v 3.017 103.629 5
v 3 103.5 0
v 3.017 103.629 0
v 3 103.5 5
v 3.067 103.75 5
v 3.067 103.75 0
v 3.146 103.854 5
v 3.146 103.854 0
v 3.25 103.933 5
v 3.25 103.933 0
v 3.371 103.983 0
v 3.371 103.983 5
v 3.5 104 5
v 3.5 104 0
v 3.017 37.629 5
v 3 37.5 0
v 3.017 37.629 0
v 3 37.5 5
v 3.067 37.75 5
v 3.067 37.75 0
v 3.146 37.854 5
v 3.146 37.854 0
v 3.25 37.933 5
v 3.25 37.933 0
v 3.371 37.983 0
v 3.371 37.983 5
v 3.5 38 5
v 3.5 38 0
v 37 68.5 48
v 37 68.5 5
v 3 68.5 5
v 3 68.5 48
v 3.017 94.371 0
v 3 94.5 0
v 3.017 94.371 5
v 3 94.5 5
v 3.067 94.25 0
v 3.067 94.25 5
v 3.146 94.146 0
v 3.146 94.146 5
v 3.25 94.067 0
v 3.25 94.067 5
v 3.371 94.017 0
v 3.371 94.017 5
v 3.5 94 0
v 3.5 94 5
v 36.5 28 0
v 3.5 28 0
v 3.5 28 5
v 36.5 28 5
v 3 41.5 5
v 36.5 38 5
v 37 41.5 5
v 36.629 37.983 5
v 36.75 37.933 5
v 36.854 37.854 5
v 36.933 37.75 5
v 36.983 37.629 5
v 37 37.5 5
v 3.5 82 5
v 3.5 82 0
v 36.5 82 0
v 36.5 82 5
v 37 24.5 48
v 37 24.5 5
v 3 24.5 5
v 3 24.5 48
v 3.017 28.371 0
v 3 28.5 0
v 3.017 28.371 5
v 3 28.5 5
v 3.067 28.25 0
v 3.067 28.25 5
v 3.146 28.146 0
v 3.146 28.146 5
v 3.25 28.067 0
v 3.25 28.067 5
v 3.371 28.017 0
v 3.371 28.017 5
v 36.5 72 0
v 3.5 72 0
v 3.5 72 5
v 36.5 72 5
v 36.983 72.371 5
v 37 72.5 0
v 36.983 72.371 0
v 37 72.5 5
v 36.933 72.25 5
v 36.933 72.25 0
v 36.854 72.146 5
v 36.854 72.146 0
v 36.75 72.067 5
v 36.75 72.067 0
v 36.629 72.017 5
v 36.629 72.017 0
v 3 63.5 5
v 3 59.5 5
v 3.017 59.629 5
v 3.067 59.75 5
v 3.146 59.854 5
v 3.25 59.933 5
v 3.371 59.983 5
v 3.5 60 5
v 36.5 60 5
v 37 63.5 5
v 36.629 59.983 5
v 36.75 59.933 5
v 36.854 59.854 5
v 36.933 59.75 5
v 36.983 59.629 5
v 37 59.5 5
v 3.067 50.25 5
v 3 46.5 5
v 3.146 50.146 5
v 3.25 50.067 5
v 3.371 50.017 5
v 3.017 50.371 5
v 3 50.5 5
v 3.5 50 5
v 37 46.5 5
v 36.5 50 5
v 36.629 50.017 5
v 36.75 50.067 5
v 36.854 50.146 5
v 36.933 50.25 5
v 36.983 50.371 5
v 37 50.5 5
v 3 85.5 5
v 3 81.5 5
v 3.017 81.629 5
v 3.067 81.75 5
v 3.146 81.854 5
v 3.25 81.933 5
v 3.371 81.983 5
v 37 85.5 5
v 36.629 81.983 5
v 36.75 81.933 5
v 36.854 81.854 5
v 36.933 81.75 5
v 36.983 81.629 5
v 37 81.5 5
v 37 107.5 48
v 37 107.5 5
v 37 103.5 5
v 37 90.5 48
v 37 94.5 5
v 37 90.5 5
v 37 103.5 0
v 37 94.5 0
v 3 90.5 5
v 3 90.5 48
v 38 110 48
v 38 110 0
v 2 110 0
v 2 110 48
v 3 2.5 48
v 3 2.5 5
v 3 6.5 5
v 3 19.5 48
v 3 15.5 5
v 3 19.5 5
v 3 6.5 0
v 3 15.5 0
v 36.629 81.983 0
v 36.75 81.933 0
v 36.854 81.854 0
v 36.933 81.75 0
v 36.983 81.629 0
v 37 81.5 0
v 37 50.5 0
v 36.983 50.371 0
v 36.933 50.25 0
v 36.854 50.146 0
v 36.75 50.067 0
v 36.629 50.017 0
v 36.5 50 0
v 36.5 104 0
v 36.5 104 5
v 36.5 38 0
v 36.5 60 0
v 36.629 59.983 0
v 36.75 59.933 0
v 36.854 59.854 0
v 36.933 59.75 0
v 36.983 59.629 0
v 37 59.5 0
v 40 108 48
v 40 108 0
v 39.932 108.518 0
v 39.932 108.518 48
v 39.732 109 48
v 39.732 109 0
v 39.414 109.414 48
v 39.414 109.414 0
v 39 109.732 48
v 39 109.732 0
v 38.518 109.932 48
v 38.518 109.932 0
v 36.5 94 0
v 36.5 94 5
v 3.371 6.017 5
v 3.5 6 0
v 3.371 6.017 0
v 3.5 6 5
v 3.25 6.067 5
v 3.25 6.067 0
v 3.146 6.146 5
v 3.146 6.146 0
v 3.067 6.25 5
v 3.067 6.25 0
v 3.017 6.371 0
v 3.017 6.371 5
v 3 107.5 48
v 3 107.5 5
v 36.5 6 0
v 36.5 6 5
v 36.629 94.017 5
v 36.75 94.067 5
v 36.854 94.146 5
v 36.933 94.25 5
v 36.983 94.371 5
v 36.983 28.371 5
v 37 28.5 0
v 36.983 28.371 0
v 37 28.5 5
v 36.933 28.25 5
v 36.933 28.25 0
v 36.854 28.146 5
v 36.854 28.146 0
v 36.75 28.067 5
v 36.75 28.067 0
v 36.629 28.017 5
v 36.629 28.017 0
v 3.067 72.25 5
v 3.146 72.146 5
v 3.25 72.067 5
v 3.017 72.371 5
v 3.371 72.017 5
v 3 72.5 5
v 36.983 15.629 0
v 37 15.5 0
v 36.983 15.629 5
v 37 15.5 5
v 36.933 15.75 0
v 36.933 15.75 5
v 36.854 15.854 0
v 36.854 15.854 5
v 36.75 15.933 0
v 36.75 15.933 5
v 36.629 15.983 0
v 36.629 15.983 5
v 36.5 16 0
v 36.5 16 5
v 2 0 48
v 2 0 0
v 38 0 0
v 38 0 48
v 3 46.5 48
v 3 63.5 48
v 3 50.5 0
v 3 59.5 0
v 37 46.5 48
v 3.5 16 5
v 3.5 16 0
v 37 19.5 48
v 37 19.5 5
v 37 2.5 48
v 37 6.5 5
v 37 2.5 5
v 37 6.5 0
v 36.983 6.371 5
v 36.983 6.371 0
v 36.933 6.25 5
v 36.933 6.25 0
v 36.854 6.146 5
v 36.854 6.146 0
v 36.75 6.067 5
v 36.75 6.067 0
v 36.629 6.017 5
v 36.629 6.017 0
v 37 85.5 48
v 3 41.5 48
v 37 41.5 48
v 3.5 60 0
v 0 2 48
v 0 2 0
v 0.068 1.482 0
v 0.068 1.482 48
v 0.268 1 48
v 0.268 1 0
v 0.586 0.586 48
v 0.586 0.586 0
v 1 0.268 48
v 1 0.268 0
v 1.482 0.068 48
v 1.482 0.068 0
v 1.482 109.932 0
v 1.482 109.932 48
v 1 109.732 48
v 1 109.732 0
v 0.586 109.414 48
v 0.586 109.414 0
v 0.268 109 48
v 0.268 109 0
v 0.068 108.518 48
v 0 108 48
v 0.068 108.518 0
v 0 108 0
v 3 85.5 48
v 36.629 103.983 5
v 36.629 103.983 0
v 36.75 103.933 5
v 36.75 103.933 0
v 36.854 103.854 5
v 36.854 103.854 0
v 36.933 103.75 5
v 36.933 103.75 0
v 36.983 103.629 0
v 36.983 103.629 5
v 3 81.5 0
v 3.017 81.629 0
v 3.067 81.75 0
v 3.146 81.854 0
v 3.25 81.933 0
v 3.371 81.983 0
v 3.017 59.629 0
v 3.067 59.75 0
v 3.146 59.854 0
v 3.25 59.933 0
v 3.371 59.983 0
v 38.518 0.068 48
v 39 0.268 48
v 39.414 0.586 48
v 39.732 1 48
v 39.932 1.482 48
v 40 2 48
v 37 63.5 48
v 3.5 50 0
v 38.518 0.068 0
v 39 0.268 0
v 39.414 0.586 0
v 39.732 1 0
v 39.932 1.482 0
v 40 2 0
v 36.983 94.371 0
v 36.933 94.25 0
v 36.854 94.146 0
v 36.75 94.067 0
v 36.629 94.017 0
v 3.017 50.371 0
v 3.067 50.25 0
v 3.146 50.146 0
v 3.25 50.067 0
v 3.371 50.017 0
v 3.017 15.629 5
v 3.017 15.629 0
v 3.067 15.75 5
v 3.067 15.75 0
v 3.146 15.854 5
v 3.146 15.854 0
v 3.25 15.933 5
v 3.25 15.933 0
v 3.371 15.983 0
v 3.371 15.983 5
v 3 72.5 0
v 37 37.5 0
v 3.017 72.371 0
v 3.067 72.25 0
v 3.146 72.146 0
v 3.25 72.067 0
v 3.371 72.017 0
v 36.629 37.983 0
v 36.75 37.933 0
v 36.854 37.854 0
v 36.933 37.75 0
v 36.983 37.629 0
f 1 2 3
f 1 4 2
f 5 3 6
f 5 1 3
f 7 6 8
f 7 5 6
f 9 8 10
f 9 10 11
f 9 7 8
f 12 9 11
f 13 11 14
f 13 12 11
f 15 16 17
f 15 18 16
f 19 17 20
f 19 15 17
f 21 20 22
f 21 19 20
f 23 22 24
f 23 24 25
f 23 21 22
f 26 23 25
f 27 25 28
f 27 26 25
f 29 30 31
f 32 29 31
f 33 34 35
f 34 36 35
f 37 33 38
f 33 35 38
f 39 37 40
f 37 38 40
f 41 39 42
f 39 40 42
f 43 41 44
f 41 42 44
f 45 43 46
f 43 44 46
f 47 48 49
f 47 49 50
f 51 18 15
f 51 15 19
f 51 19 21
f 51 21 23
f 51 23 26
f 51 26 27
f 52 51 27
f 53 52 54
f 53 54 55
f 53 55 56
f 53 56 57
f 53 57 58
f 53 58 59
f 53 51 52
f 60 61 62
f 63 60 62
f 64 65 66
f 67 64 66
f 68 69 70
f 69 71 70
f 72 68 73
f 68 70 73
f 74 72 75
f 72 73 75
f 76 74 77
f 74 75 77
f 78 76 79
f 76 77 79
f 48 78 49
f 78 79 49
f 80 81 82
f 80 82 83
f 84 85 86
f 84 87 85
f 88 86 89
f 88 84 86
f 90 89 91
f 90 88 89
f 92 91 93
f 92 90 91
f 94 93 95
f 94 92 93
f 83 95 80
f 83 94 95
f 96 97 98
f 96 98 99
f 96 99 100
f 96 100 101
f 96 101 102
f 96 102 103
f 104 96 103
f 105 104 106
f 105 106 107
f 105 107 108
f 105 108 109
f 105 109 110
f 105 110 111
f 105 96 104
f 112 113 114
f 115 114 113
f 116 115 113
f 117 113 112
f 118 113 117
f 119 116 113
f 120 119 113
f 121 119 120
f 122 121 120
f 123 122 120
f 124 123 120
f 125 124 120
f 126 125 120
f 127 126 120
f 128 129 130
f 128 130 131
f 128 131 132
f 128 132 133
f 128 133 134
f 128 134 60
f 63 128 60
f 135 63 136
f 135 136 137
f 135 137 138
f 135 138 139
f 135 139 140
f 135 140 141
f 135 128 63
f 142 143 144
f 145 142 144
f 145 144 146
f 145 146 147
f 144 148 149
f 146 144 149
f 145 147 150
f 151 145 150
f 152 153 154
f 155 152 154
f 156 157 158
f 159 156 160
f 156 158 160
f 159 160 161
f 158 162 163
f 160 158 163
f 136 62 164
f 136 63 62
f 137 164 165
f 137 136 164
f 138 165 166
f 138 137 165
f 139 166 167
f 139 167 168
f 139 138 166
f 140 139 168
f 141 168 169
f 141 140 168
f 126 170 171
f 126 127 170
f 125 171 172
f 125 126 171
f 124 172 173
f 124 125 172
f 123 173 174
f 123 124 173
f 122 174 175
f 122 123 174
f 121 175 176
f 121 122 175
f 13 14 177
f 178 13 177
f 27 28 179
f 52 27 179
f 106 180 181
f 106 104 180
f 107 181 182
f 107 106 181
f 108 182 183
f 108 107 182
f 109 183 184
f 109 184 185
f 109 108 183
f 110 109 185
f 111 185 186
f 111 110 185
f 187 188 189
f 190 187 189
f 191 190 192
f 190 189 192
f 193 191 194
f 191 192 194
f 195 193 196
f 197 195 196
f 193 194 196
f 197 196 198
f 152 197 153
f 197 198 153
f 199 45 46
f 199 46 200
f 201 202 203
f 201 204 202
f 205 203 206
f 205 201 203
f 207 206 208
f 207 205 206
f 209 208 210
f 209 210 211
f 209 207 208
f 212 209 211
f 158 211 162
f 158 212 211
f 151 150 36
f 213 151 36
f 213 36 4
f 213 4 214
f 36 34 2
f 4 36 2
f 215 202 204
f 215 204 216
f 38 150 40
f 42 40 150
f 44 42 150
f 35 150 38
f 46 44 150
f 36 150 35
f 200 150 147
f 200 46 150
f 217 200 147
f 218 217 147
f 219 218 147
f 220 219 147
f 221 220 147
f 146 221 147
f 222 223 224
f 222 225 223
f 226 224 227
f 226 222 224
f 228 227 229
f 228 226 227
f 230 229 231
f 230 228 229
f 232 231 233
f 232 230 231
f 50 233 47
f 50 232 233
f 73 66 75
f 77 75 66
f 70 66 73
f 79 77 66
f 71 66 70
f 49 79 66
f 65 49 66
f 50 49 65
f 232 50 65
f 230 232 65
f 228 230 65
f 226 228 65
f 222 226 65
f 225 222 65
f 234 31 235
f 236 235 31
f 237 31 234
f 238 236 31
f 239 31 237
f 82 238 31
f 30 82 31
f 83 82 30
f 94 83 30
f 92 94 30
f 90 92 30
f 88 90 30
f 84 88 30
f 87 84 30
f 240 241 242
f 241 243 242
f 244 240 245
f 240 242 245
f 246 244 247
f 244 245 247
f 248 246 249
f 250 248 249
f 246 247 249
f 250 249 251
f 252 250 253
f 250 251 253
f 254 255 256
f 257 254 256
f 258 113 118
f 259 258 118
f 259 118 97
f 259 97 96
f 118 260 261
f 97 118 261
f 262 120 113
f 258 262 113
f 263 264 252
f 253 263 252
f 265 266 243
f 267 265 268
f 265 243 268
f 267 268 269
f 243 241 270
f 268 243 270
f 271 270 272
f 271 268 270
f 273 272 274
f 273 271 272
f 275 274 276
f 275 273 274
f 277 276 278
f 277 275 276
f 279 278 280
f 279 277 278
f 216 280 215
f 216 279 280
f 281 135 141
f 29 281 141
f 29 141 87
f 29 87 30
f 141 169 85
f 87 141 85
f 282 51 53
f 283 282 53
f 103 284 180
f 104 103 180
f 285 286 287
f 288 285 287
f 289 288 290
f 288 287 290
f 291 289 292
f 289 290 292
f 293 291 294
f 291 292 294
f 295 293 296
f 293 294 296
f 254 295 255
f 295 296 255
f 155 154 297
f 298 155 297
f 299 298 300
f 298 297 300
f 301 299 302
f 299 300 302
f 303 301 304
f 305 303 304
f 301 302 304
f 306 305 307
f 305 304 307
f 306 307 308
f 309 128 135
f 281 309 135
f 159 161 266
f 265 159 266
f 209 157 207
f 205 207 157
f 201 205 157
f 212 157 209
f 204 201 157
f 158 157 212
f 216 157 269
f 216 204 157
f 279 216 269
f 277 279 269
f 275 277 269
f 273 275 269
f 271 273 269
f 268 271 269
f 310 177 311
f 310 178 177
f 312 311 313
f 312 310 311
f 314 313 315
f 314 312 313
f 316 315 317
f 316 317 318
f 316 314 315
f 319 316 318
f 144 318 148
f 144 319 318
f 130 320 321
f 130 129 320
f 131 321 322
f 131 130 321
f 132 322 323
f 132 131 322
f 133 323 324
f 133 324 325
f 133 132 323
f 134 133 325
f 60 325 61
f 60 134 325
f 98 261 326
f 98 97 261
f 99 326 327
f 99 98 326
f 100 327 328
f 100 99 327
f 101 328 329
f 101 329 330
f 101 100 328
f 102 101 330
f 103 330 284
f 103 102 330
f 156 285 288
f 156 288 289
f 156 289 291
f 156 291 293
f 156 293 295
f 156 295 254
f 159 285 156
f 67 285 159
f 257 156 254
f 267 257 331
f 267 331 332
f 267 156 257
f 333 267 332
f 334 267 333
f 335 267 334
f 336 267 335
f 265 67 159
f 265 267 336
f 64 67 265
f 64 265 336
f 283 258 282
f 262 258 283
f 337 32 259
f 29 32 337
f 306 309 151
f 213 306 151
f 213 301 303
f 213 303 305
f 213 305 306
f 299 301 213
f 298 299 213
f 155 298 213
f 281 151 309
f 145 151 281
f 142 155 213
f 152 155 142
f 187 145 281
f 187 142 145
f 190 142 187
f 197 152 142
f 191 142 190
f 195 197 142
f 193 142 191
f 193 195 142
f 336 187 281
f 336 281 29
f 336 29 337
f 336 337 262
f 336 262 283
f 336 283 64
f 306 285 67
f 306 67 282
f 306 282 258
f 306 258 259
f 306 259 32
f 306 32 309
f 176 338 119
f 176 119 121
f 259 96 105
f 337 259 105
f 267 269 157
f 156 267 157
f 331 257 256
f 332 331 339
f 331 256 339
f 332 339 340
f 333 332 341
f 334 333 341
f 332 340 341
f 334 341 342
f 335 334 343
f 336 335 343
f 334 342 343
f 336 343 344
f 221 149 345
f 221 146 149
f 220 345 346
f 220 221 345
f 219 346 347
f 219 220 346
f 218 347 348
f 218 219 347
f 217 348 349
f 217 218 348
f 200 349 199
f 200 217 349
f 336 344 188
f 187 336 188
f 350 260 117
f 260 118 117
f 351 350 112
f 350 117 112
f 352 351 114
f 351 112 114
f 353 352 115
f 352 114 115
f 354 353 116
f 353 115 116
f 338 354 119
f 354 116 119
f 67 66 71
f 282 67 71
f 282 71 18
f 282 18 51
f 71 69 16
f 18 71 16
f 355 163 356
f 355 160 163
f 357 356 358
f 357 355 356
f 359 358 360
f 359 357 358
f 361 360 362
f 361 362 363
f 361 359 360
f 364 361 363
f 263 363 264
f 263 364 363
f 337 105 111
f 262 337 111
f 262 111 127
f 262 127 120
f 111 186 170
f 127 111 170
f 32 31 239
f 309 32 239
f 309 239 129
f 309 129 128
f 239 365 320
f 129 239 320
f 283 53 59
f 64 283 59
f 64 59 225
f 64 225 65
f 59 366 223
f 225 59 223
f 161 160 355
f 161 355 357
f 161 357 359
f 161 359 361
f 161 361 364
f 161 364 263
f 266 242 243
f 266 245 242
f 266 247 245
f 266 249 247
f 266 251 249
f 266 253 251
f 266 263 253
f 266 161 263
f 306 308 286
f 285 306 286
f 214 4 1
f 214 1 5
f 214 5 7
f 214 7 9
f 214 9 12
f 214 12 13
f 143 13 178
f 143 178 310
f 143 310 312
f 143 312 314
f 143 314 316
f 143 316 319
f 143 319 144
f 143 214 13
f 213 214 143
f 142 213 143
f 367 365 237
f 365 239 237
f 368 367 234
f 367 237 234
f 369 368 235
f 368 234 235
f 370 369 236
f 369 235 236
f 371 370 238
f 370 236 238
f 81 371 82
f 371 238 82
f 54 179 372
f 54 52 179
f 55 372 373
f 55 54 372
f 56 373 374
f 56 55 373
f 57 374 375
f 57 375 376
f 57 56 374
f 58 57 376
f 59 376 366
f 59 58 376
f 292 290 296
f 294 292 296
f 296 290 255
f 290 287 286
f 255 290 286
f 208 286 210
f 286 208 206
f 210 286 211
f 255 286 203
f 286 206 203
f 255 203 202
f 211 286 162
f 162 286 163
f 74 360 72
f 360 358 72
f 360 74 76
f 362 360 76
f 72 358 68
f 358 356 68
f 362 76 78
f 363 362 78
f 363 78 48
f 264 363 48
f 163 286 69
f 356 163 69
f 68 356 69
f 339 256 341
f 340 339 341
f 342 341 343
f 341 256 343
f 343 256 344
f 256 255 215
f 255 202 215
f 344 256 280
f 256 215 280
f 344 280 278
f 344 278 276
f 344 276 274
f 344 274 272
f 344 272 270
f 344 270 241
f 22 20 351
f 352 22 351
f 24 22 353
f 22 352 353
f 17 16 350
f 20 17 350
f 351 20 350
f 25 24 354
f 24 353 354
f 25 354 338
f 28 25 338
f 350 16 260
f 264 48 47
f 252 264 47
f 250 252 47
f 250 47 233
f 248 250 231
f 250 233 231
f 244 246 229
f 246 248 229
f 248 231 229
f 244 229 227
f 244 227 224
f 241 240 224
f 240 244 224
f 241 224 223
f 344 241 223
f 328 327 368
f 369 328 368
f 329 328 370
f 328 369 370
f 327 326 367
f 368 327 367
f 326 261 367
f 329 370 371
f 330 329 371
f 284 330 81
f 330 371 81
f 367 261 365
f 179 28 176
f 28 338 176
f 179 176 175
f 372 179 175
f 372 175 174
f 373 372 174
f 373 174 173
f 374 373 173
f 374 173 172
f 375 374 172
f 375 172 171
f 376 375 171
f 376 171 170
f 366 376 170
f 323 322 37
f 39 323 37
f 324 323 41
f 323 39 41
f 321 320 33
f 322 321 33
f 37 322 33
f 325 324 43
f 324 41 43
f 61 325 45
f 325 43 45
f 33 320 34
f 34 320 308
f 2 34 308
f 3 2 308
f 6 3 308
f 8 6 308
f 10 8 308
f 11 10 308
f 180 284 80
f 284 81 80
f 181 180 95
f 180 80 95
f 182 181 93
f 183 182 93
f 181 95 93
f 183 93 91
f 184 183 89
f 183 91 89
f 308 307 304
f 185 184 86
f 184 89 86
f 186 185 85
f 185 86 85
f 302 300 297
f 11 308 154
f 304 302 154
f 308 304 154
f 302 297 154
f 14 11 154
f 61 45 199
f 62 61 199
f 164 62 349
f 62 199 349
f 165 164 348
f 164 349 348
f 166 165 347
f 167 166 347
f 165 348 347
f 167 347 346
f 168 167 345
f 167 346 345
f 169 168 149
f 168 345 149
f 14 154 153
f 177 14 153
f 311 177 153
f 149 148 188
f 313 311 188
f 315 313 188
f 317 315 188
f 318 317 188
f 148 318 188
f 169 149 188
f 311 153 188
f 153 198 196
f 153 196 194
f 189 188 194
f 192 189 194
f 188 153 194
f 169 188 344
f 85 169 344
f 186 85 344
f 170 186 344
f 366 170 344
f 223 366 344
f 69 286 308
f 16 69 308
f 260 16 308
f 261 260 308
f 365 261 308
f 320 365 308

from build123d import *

# Parameters (mm, degrees)
F0_W     = 34
F0_H     = 3.5
F1_DEPTH = 5
F2_R     = 0.5
F3_DEPTH = 48


with BuildPart() as f1:
    # F0 (on Top) → F1 (new body)
    with BuildSketch(Plane.XY):
        with BuildLine():
            ThreePointArc((0, 2), (0.585786, 0.585786), (2, 0))
            Line((2, 0), (38, 0))
            ThreePointArc((38, 0), (39.414214, 0.585786), (40, 2))
            Line((40, 2), (40, 108))
            ThreePointArc((40, 108), (39.414214, 109.414214), (38, 110))
            Line((38, 110), (2, 110))
            ThreePointArc((2, 110), (0.585786, 109.414214), (0, 108))
            Line((0, 108), (0, 2))
        make_face()
        Polygon((37, 2.5), (3, 2.5), (3, 6), (3, 16), (3, 19.5), (37, 19.5), (37, 16), (37, 6), align=None, mode=Mode.SUBTRACT)
        Polygon((3, 38), (3, 41.5), (37, 41.5), (37, 38), (37, 28), (37, 24.5), (3, 24.5), (3, 28), align=None, mode=Mode.SUBTRACT)
        Polygon((3, 60), (3, 63.5), (37, 63.5), (37, 60), (37, 50), (37, 46.5), (3, 46.5), (3, 50), align=None, mode=Mode.SUBTRACT)
        Polygon((3, 82), (3, 85.5), (37, 85.5), (37, 82), (37, 72), (37, 68.5), (3, 68.5), (3, 72), align=None, mode=Mode.SUBTRACT)
        Polygon((3, 104), (3, 107.5), (37, 107.5), (37, 104), (37, 94), (37, 90.5), (3, 90.5), (3, 94), align=None, mode=Mode.SUBTRACT)
        with Locations((20, 17.75)):
            Rectangle(F0_W, F0_H)
        with Locations((20, 39.75)):
            Rectangle(F0_W, F0_H)
        with Locations((20, 61.75)):
            Rectangle(F0_W, F0_H)
        with Locations((20, 83.75)):
            Rectangle(F0_W, F0_H)
        with Locations((20, 105.75)):
            Rectangle(F0_W, F0_H)
        with Locations((20, 92.25)):
            Rectangle(F0_W, F0_H)
        with Locations((20, 70.25)):
            Rectangle(F0_W, F0_H)
        with Locations((20, 48.25)):
            Rectangle(F0_W, F0_H)
        with Locations((20, 26.25)):
            Rectangle(F0_W, F0_H)
        with Locations((20, 4.25)):
            Rectangle(F0_W, F0_H)
    extrude(amount=F1_DEPTH)

    # F2
    f2_edges = [f1.edges().sort_by_distance(p)[0] for p in [
        (3, 28, 2.5),
        (3, 6, 2.5),
        (3, 50, 2.5),
        (3, 72, 2.5),
        (3, 94, 2.5),
        (3, 104, 2.5),
        (3, 82, 2.5),
        (3, 60, 2.5),
        (3, 38, 2.5),
        (3, 16, 2.5),
        (37, 104, 2.5),
        (37, 82, 2.5),
        (37, 60, 2.5),
        (37, 38, 2.5),
        (37, 16, 2.5),
        (37, 6, 2.5),
        (37, 28, 2.5),
        (37, 50, 2.5),
        (37, 72, 2.5),
        (37, 94, 2.5),
    ]]
    fillet(f2_edges, radius=F2_R)

    # F0 (on Top) → F3 (join)
    with BuildSketch(Plane.XY):
        with BuildLine():
            ThreePointArc((0, 2), (0.585786, 0.585786), (2, 0))
            Line((2, 0), (38, 0))
            ThreePointArc((38, 0), (39.414214, 0.585786), (40, 2))
            Line((40, 2), (40, 108))
            ThreePointArc((40, 108), (39.414214, 109.414214), (38, 110))
            Line((38, 110), (2, 110))
            ThreePointArc((2, 110), (0.585786, 109.414214), (0, 108))
            Line((0, 108), (0, 2))
        make_face()
        Polygon((37, 2.5), (3, 2.5), (3, 6), (3, 16), (3, 19.5), (37, 19.5), (37, 16), (37, 6), align=None, mode=Mode.SUBTRACT)
        Polygon((3, 38), (3, 41.5), (37, 41.5), (37, 38), (37, 28), (37, 24.5), (3, 24.5), (3, 28), align=None, mode=Mode.SUBTRACT)
        Polygon((3, 60), (3, 63.5), (37, 63.5), (37, 60), (37, 50), (37, 46.5), (3, 46.5), (3, 50), align=None, mode=Mode.SUBTRACT)
        Polygon((3, 82), (3, 85.5), (37, 85.5), (37, 82), (37, 72), (37, 68.5), (3, 68.5), (3, 72), align=None, mode=Mode.SUBTRACT)
        Polygon((3, 104), (3, 107.5), (37, 107.5), (37, 104), (37, 94), (37, 90.5), (3, 90.5), (3, 94), align=None, mode=Mode.SUBTRACT)
    extrude(amount=F3_DEPTH)


solid = f1.part
